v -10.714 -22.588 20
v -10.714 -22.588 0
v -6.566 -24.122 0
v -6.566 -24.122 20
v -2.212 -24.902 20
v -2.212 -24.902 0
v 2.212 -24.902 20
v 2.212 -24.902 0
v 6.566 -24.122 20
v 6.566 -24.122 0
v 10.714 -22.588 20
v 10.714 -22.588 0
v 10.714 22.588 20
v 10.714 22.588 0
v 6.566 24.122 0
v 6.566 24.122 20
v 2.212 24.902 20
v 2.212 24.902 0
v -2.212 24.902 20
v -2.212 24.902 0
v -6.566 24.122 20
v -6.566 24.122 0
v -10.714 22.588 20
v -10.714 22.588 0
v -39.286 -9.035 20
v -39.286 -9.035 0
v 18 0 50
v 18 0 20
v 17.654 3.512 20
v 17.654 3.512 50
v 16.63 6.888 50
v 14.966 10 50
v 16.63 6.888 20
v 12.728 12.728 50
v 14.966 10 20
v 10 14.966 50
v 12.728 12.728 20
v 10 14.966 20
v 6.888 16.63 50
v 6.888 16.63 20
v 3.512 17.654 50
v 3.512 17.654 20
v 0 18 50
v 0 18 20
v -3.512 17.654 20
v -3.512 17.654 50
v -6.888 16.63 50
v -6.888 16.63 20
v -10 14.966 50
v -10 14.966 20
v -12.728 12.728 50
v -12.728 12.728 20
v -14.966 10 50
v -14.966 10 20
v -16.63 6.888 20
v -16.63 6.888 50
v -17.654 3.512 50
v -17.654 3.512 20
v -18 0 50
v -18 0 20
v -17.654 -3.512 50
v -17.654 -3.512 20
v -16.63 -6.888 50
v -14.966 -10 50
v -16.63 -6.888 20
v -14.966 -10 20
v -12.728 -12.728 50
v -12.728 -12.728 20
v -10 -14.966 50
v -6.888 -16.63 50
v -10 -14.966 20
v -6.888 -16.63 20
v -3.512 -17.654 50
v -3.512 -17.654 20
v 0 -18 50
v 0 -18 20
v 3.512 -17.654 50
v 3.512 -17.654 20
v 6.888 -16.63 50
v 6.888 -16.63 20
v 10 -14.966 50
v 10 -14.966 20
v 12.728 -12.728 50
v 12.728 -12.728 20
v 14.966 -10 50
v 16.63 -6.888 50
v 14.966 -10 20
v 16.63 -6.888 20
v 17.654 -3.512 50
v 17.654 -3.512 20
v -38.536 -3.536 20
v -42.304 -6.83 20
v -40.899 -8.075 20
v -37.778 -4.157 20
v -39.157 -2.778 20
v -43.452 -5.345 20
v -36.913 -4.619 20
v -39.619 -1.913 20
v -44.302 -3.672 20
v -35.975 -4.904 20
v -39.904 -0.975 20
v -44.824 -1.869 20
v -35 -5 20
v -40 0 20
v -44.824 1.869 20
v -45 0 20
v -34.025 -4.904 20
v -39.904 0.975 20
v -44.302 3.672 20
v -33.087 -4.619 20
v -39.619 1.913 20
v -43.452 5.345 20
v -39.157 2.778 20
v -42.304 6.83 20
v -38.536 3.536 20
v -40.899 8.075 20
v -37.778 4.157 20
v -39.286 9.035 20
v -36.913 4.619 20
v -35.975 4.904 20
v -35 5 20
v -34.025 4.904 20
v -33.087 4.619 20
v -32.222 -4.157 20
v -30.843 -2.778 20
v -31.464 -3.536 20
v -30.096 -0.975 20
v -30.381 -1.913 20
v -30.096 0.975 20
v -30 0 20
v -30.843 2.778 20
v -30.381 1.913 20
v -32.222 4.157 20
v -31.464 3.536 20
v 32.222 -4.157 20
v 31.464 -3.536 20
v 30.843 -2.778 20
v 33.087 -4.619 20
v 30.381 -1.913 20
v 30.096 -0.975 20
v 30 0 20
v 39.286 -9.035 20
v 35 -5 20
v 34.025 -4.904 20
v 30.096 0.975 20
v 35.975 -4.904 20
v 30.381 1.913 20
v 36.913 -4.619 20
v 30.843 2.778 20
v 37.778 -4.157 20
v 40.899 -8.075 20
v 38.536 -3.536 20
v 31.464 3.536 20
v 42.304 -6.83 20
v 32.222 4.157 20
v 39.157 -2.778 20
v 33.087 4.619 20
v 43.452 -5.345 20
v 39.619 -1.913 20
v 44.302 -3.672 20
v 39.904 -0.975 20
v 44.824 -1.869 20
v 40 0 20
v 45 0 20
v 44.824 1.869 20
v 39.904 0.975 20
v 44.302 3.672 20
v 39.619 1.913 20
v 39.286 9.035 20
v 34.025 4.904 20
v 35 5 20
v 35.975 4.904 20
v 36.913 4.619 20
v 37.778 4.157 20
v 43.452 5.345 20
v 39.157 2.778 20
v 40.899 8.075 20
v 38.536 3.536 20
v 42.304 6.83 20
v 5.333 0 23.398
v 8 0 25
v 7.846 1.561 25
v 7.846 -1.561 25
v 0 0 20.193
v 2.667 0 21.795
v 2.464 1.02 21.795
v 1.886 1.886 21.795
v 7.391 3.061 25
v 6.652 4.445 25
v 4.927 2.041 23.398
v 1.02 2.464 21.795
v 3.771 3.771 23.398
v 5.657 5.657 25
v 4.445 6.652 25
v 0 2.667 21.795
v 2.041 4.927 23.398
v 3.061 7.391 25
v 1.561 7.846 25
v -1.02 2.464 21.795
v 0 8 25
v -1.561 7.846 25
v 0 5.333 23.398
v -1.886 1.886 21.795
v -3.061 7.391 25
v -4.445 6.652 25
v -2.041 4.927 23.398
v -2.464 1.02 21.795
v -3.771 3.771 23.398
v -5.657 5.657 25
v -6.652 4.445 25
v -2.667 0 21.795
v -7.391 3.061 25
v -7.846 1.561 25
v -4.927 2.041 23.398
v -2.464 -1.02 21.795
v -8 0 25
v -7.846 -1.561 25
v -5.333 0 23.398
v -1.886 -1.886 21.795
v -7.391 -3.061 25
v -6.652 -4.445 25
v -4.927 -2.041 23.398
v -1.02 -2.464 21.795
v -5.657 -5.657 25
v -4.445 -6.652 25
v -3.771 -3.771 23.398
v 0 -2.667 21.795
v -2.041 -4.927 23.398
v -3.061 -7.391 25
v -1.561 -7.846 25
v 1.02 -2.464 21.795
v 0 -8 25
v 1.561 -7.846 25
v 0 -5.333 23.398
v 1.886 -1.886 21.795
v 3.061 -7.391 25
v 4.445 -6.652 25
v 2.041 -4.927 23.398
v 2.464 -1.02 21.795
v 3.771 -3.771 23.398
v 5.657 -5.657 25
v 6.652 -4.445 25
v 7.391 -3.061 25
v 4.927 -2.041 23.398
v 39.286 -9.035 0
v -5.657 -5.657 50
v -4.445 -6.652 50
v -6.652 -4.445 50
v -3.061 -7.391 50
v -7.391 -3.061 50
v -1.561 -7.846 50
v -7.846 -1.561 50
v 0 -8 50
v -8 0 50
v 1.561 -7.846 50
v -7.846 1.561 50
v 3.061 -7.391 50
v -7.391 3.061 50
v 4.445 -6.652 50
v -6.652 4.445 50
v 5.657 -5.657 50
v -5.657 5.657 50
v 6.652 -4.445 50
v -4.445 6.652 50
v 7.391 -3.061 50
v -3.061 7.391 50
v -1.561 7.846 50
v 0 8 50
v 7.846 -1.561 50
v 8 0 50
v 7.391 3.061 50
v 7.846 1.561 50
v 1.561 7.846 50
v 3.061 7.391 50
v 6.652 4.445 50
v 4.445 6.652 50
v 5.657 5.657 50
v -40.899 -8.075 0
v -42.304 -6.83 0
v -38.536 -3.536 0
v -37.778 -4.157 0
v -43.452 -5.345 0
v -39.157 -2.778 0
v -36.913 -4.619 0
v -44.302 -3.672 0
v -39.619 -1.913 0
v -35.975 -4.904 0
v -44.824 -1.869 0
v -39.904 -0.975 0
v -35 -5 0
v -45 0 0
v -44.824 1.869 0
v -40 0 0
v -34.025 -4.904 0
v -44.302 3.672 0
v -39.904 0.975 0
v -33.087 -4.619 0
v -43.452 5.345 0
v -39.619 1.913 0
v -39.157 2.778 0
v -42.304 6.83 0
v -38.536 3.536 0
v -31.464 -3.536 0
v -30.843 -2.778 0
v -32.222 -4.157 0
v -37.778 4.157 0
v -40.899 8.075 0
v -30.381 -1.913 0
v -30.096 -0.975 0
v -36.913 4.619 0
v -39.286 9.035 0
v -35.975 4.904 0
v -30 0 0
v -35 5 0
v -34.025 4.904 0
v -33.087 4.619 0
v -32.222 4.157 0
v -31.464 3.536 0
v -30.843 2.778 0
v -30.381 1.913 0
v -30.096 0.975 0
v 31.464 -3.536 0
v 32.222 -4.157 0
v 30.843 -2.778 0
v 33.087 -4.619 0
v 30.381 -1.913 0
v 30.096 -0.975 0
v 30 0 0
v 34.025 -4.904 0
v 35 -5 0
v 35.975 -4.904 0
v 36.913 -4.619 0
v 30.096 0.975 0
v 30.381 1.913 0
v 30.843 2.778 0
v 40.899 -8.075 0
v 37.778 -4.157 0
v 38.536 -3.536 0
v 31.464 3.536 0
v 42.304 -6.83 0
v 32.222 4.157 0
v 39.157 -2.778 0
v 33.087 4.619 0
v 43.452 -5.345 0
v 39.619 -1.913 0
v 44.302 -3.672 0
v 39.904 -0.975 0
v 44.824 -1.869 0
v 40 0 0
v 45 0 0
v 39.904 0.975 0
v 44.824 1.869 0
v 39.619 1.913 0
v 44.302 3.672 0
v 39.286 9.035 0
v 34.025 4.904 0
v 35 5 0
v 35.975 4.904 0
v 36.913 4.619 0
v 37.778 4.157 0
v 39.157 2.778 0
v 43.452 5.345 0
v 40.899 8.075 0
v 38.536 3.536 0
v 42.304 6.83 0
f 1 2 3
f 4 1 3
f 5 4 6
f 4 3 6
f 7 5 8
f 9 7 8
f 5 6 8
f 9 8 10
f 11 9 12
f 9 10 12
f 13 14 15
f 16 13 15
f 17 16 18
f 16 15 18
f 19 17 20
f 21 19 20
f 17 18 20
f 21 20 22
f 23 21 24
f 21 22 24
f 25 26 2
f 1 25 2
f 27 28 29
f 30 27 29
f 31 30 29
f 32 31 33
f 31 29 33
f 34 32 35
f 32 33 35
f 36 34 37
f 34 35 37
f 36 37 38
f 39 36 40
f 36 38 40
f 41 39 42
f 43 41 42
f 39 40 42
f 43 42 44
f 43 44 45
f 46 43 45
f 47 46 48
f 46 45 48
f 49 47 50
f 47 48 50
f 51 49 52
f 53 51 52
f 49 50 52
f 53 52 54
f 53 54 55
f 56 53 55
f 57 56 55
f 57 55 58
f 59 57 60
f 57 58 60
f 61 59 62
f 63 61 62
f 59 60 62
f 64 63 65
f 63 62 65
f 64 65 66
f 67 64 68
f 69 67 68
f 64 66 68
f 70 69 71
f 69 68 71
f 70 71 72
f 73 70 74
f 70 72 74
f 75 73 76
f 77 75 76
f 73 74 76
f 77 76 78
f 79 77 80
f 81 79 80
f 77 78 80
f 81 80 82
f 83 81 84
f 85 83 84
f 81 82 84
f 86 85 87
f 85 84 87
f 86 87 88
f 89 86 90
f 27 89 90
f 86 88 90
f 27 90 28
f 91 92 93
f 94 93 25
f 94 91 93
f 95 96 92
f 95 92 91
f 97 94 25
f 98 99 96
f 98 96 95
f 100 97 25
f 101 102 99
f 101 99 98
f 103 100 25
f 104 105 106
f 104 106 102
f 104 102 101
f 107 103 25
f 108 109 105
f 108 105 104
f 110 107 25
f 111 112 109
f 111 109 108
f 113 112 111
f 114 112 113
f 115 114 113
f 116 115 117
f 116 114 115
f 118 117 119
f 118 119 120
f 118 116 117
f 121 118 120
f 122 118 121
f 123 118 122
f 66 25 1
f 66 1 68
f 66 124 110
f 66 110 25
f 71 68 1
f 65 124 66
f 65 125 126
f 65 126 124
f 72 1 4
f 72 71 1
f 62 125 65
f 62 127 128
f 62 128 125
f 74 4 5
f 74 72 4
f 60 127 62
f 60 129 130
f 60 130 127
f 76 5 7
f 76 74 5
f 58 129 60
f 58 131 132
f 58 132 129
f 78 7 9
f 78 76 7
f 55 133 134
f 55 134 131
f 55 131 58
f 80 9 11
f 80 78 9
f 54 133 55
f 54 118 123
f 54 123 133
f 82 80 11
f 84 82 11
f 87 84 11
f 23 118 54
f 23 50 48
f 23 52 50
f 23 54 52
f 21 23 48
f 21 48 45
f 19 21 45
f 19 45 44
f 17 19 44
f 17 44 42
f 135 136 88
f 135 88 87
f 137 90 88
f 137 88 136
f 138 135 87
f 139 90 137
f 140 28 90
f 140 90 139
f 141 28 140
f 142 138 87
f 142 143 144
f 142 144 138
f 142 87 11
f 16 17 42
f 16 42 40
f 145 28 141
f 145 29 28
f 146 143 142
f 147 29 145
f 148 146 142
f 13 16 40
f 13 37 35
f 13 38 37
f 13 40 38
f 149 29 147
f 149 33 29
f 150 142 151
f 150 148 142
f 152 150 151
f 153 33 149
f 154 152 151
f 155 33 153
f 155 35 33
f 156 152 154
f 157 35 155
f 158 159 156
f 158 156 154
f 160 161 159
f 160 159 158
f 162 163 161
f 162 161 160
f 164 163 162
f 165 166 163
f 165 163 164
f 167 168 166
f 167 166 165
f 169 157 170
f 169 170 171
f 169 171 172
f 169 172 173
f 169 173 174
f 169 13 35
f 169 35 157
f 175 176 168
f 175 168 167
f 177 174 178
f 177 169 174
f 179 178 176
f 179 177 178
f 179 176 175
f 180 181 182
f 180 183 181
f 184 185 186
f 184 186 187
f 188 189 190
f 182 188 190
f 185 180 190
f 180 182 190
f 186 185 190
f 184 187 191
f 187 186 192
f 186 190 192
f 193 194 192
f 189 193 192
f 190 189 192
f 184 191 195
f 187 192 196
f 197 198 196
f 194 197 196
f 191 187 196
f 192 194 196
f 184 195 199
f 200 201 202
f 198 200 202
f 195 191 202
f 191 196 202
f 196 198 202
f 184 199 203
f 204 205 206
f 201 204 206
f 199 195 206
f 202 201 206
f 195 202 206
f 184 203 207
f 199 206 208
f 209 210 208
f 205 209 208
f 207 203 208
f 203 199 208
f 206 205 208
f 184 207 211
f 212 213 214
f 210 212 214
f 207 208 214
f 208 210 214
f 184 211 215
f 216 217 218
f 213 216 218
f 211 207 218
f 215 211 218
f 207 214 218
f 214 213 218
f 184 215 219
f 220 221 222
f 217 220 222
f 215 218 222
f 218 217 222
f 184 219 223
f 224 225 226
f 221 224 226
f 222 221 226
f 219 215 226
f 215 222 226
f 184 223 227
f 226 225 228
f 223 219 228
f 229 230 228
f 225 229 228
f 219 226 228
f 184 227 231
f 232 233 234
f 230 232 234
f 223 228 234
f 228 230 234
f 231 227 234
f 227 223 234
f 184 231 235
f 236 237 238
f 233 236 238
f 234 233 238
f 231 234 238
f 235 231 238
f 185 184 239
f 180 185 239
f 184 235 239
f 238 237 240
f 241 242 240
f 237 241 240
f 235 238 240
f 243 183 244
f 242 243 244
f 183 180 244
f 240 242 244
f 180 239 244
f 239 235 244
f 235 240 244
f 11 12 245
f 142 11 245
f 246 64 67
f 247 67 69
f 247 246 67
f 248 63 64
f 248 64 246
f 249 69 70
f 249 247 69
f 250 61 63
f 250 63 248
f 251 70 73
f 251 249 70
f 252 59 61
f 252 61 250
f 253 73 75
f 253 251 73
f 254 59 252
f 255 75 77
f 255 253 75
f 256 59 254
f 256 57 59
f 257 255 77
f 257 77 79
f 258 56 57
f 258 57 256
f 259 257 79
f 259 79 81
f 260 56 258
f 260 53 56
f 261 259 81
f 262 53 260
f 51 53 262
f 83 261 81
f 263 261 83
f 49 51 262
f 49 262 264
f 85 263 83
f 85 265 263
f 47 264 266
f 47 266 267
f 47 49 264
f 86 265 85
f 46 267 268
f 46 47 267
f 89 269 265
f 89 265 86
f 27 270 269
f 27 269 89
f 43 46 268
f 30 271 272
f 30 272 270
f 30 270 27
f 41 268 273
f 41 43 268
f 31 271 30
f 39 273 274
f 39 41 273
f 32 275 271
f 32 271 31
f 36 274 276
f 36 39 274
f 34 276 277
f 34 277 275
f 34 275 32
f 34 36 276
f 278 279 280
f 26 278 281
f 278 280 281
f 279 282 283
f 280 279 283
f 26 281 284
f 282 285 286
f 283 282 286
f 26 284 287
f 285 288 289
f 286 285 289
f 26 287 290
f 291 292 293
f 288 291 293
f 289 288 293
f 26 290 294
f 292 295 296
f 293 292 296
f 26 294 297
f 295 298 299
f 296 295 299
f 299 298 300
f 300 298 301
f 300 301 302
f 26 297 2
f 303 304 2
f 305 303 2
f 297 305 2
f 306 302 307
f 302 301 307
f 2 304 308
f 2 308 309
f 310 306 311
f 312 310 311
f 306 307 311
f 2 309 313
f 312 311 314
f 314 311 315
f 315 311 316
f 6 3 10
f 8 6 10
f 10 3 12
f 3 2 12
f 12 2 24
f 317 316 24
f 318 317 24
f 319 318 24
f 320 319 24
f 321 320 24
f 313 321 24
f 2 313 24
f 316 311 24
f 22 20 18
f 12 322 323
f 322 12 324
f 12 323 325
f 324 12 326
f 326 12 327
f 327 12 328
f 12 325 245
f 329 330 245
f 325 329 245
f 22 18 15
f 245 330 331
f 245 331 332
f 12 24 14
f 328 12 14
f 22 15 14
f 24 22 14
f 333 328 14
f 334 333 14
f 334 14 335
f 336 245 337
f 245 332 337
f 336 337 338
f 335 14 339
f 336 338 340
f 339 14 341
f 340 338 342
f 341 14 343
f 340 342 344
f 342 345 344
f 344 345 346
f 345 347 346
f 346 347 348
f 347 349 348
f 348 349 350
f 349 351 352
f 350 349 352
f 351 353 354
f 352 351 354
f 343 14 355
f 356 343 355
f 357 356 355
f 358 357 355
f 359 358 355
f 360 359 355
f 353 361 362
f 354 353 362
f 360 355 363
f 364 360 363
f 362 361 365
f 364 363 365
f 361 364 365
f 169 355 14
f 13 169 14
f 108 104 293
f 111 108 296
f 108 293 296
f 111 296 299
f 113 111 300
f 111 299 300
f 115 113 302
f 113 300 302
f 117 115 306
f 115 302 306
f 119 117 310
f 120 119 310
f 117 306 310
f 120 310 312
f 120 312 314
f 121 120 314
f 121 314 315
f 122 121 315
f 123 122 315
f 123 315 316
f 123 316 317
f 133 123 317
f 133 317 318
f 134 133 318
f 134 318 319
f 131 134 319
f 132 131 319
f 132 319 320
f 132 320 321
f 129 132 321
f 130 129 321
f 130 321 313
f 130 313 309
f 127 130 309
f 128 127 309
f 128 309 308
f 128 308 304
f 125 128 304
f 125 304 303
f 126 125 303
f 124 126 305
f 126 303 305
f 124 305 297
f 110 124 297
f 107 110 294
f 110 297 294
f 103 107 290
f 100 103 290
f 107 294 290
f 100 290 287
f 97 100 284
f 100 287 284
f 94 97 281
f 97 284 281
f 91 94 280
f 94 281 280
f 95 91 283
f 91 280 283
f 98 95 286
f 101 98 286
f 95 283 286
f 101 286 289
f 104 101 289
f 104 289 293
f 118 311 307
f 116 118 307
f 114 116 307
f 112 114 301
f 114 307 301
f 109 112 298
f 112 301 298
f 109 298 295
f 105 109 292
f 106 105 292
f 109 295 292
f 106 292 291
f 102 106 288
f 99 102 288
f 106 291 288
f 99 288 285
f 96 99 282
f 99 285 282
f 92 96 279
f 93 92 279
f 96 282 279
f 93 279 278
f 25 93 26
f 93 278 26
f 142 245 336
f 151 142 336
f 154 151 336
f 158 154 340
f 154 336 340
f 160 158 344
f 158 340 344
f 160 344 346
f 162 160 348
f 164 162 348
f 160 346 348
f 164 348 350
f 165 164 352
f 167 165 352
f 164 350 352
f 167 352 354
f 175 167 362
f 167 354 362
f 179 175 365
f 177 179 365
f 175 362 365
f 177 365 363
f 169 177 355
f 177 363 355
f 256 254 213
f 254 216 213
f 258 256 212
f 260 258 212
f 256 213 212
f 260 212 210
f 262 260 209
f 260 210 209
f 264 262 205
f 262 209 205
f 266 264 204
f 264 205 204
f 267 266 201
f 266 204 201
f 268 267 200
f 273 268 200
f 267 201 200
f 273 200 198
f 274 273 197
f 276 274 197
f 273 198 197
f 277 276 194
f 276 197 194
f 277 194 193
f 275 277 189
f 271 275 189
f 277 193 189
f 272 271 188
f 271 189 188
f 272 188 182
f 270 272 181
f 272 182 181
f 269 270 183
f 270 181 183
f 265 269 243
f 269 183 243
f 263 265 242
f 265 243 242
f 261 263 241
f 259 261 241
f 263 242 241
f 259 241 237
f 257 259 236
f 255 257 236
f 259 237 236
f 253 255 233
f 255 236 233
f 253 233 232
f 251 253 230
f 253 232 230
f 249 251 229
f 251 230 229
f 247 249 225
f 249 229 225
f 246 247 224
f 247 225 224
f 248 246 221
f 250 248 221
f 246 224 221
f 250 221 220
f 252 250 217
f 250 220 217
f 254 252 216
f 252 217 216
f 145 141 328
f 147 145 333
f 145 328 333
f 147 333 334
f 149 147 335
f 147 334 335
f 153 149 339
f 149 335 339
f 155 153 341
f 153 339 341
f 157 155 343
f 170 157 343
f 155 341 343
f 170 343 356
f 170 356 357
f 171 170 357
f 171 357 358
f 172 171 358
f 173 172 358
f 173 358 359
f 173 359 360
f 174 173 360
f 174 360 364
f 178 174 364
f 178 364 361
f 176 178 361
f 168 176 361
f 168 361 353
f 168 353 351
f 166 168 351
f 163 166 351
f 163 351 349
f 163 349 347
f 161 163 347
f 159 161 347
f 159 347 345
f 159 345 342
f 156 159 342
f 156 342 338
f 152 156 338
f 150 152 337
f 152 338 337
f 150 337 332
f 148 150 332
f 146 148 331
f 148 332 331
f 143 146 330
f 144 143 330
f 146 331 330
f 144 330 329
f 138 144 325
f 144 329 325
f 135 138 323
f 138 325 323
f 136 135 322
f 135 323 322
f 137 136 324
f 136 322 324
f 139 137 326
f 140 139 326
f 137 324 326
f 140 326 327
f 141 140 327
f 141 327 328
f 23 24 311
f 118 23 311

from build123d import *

# Parameters (mm, degrees)
F1_DEPTH = 20
F3_D     = 10
F2_R     = 18
F4_DEPTH = 30
F6_D     = 16
F6_DEPTH = 25
F6_TIP   = 4.8068849522


with BuildPart() as f1:
    # F0 (on Top) → F1 (new body)
    with BuildSketch(Plane.XY):
        with BuildLine():
            Line((-10.7142857143, 22.5876975726), (-39.2857142857, 9.0350790291))
            ThreePointArc((-39.2857142857, 9.0350790291), (-45, 0), (-39.2857142857, -9.0350790291))
            Line((-39.2857142857, -9.0350790291), (-10.7142857143, -22.5876975726))
            ThreePointArc((-10.7142857143, -22.5876975726), (0, -25), (10.7142857143, -22.5876975726))
            Line((10.7142857143, -22.5876975726), (39.2857142857, -9.0350790291))
            ThreePointArc((39.2857142857, -9.0350790291), (45, 0), (39.2857142857, 9.0350790291))
            Line((39.2857142857, 9.0350790291), (10.7142857143, 22.5876975726))
            ThreePointArc((10.7142857143, 22.5876975726), (0, 25), (-10.7142857143, 22.5876975726))
        make_face()
    extrude(amount=F1_DEPTH)

    # F3 (through all)
    with Locations(Plane.XY.offset(20)):
        with Locations((-35, 0), (35, 0)):
            Hole(F3_D / 2)

    # F2 (on face) → F4 (join)
    with BuildSketch(Plane.XY.offset(20)):
        Circle(F2_R)
    extrude(amount=F4_DEPTH)

    # F6
    with Locations(Plane.XY.offset(50)):
        with Locations((0, 0)):
            Hole(F6_D / 2, depth=F6_DEPTH)
            with Locations((0, 0, -(F6_DEPTH + F6_TIP / 2))):  # 118° drill point
                Cone(0, F6_D / 2, F6_TIP, mode=Mode.SUBTRACT)


solid = f1.part
